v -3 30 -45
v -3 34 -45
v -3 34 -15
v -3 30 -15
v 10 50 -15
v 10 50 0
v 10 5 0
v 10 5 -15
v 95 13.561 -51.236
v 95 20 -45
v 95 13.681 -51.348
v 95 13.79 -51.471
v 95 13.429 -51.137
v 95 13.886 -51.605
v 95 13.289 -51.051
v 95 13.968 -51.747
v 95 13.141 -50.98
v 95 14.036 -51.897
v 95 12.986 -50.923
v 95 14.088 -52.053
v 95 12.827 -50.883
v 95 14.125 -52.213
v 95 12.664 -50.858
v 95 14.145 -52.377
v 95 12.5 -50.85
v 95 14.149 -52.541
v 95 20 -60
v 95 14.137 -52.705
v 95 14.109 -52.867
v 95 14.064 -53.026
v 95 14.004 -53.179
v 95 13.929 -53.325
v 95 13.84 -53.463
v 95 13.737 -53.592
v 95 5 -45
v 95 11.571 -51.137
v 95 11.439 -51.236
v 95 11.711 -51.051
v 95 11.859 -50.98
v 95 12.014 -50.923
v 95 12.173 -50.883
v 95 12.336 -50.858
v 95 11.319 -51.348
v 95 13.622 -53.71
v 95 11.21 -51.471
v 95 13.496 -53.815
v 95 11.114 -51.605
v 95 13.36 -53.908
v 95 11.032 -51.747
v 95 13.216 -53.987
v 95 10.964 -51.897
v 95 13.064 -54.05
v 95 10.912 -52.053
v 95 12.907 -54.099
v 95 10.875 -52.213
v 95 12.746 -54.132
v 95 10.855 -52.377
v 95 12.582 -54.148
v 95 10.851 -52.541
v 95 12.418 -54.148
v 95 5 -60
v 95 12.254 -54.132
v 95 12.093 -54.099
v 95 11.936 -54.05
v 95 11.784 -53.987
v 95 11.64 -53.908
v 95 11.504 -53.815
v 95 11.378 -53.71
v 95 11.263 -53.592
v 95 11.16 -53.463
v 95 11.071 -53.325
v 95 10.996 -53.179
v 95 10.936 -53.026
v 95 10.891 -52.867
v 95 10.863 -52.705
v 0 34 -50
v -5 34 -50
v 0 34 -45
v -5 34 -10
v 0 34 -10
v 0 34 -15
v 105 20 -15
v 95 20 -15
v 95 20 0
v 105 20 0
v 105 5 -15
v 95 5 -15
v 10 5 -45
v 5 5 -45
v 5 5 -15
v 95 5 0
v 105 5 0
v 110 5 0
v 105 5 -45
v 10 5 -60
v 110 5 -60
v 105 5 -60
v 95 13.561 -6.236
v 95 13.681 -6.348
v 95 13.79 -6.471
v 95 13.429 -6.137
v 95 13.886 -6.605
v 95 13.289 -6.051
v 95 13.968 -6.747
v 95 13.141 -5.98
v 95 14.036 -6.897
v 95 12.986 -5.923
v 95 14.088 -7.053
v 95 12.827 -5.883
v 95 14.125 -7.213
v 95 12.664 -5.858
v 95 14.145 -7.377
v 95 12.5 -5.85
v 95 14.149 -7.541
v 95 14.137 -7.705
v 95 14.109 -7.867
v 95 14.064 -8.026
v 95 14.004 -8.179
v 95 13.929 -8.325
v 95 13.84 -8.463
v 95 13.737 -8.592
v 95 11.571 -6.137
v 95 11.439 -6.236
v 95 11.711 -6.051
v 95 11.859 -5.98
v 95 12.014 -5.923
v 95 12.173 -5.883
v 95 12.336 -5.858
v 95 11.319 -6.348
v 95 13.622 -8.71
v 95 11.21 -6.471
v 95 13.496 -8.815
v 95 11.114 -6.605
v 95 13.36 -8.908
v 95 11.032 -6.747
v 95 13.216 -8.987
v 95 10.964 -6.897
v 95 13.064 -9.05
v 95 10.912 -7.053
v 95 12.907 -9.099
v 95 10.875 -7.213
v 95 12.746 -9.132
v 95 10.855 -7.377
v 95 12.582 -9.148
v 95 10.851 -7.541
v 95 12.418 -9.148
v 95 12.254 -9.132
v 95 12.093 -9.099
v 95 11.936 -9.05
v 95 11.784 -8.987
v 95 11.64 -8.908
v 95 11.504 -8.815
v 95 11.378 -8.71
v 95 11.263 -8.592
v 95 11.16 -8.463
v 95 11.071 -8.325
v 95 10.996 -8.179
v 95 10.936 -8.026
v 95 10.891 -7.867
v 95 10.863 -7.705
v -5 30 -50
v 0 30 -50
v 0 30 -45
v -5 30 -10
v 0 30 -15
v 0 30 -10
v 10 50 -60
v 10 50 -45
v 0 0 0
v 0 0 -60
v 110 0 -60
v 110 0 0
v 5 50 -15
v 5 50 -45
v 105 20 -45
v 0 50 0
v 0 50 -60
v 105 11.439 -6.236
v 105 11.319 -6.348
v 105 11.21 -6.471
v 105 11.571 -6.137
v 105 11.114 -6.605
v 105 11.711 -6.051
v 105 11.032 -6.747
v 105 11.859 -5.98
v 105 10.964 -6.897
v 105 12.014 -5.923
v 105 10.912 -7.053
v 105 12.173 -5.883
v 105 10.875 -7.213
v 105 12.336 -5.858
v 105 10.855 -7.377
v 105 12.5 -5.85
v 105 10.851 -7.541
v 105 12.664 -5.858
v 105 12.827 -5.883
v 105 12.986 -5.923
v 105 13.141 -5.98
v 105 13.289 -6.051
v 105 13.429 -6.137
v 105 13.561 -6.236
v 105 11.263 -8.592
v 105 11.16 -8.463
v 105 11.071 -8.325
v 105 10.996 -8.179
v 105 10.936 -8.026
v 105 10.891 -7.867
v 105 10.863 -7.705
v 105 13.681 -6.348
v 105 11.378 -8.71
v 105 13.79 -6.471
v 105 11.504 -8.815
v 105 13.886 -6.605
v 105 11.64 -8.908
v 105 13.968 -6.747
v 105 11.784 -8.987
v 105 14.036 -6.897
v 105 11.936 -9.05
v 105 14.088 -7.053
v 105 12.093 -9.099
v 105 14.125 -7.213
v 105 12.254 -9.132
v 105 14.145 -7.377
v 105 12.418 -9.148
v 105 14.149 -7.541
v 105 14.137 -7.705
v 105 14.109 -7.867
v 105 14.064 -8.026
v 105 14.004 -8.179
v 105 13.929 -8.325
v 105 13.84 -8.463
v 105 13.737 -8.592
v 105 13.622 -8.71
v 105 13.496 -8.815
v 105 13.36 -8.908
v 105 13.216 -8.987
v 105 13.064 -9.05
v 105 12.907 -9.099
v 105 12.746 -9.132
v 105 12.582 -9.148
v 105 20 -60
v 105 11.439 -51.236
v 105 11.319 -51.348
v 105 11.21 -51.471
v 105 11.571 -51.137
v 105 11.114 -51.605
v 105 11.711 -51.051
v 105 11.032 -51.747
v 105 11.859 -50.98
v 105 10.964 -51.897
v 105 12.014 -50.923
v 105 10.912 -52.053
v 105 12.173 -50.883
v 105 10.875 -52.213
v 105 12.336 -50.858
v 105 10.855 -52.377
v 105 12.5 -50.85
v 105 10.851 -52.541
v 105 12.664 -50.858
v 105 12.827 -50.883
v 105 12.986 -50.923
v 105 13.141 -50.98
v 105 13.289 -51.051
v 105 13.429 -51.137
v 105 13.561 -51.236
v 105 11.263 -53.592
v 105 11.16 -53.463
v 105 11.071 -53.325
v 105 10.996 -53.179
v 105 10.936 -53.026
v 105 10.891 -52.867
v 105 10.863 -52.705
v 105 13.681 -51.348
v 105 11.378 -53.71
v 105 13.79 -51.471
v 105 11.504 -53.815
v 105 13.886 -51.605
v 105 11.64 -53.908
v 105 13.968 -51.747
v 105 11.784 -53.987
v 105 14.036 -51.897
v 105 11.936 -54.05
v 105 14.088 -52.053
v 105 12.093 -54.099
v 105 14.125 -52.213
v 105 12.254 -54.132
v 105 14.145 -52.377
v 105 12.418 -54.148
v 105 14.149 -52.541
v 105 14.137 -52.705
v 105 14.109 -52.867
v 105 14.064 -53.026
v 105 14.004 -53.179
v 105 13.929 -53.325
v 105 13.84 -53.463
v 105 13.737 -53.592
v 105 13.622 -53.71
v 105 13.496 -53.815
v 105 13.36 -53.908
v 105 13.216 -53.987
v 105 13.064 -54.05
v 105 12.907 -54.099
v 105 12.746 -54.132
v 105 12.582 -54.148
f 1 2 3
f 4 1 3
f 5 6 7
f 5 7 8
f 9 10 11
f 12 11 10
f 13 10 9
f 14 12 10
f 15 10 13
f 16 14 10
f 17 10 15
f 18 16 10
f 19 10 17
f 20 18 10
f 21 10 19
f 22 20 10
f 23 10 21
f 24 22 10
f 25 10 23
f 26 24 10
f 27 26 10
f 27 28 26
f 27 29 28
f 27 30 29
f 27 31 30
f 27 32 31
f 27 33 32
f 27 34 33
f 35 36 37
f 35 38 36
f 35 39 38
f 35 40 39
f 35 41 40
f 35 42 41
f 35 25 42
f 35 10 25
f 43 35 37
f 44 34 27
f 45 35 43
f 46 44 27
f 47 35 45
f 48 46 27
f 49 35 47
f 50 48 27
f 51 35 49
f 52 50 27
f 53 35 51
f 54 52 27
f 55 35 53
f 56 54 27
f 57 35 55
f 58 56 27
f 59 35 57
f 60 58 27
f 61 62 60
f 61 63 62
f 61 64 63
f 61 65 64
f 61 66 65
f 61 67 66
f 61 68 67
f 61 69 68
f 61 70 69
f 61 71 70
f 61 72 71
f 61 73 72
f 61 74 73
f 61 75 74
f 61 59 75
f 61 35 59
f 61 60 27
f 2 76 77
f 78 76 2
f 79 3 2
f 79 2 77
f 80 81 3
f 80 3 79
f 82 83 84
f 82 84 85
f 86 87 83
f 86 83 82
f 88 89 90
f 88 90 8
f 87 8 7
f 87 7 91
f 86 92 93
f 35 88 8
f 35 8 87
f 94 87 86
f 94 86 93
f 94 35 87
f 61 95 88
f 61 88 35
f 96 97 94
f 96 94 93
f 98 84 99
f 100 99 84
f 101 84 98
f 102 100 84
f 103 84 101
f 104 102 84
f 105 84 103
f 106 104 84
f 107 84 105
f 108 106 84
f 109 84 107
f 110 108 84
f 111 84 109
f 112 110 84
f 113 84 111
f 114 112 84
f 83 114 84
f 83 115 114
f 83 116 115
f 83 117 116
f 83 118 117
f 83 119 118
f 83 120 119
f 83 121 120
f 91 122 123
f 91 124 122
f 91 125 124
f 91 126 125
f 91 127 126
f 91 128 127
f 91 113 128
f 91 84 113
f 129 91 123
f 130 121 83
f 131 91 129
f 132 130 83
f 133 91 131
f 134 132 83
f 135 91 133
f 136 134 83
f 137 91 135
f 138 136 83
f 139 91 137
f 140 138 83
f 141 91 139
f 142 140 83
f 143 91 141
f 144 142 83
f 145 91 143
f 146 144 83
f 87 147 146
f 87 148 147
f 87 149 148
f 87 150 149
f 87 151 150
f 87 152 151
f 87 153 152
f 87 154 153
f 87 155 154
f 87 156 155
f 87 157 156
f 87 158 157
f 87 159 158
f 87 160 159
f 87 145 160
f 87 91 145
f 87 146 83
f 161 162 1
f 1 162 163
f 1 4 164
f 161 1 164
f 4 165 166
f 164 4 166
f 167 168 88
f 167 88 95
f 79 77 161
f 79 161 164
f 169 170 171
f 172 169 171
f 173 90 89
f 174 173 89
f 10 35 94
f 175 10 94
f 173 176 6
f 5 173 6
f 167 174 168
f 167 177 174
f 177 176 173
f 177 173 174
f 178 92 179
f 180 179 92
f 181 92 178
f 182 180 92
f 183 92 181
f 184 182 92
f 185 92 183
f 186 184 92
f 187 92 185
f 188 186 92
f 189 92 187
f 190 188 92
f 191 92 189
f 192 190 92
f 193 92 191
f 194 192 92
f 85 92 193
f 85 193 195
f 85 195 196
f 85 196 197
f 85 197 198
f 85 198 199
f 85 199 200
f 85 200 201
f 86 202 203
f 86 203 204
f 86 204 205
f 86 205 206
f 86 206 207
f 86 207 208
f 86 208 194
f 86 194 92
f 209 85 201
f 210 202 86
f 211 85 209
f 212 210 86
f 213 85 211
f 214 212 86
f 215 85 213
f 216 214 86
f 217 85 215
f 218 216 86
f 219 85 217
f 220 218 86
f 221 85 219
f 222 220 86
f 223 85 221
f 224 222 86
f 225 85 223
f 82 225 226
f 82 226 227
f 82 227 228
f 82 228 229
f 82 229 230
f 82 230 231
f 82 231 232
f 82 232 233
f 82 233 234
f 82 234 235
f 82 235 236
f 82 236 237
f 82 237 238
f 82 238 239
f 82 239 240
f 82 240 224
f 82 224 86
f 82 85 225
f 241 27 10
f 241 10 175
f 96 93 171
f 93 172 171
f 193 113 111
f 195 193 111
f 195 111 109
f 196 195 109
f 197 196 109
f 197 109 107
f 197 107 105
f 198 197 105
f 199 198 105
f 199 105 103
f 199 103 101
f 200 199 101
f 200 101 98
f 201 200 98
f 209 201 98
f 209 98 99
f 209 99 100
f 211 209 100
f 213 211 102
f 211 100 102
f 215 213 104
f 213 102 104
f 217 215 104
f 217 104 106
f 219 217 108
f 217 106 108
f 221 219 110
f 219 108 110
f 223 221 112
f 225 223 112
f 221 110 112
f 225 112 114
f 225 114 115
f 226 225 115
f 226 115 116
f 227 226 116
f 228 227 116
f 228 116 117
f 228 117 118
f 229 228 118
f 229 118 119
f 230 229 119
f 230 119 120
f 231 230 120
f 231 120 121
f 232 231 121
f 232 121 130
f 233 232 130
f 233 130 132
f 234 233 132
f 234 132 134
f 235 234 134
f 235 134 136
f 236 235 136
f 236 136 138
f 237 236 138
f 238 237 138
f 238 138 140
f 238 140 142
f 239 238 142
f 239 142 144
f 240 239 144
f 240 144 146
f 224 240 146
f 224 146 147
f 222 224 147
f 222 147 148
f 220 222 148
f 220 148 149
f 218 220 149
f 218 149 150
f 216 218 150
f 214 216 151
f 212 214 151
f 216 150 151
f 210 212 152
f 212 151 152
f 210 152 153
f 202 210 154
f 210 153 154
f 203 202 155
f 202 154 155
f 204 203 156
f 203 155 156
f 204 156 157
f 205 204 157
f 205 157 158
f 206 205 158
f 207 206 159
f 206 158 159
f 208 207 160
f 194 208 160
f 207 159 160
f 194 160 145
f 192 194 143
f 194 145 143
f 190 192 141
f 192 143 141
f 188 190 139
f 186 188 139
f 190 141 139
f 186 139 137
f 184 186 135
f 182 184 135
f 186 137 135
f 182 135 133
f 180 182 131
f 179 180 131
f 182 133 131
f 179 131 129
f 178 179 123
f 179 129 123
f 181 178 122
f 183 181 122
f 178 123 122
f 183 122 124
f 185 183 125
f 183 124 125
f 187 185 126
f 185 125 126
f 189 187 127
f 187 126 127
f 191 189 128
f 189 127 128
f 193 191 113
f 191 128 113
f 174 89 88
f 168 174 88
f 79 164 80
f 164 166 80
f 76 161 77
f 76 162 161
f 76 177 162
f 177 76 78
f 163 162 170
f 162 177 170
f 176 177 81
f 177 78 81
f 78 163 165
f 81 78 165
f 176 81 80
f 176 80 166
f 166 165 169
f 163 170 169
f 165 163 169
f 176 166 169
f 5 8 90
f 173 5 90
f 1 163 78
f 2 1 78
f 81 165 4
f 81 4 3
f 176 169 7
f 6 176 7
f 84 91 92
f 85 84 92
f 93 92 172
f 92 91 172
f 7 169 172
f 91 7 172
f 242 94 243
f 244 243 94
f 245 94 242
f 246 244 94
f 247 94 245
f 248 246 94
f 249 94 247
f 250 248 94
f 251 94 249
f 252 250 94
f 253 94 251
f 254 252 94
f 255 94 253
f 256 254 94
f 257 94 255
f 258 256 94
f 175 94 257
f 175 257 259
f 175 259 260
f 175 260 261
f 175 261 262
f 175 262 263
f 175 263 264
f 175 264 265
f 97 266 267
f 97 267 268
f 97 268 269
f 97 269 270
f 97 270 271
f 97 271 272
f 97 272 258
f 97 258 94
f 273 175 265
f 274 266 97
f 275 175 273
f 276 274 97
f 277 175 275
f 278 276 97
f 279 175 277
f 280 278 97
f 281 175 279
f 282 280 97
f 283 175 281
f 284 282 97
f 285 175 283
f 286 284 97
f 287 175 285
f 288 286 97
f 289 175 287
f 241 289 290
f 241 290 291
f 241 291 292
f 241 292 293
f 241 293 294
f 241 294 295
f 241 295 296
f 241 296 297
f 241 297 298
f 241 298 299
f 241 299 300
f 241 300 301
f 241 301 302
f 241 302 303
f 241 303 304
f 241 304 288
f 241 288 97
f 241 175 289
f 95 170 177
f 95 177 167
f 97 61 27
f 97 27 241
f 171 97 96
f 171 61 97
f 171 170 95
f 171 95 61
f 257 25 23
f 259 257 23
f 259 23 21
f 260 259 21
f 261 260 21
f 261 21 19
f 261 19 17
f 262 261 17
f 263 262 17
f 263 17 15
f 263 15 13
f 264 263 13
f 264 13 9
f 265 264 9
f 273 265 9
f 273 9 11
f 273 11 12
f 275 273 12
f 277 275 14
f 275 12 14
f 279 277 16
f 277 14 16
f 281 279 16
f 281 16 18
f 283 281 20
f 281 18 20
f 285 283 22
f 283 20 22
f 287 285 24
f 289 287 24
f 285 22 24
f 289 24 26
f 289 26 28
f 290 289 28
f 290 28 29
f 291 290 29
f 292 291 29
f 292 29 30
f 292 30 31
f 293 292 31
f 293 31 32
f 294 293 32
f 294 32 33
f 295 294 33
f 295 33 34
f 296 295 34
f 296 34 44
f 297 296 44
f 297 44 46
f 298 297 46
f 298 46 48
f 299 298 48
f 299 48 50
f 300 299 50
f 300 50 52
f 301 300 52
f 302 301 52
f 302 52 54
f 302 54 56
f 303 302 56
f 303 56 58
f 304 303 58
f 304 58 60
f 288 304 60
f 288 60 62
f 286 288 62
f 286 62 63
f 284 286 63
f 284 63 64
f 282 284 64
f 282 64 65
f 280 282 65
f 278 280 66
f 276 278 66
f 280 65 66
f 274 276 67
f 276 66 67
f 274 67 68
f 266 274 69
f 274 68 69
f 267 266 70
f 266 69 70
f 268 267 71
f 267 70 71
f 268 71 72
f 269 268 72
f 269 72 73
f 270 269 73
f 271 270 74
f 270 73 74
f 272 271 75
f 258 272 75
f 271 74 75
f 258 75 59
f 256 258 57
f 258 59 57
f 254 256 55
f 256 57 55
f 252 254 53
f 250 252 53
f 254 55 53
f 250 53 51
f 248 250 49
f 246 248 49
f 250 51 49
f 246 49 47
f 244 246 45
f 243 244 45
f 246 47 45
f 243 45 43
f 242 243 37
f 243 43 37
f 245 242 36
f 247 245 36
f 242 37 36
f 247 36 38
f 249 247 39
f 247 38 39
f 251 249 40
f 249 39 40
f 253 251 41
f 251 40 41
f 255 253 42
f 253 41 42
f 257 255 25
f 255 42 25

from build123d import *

# Parameters (mm, degrees)
CROQUIS1_W                = 110
CROQUIS1_H                = 60
SALIENTE_EXTRUIR1_DEPTH   = 5
SALIENTE_EXTRUIR2_DEPTH   = 45
CROQUIS4_W                = 15
CROQUIS4_H                = 15
SALIENTE_EXTRUIR3_DEPTH   = 15
CROQUIS5_W                = 15
CROQUIS5_H                = 15
CORTAR_EXTRUIR1_DEPTH     = 5
TALADRO_ROSCADO_M41_D     = 3.3
TALADRO_ROSCADO_M41_DEPTH = 14.008579979
TALADRO_ROSCADO_M41_TIP   = 0.991420021
CROQUIS11_W               = 5
CROQUIS11_H               = 4
SALIENTE_EXTRUIR4_DEPTH   = 3
CROQUIS12_W               = 40
CROQUIS12_H               = 4
SALIENTE_EXTRUIR5_DEPTH   = 2


with BuildPart() as part:
    # Croquis1 → Saliente-Extruir1 (new body)
    with BuildSketch(Plane(origin=(0, 0, 0), x_dir=(1, 0, 0), z_dir=(0, 1, 0))):
        with Locations((55, 30)):
            Rectangle(CROQUIS1_W, CROQUIS1_H)
    extrude(amount=SALIENTE_EXTRUIR1_DEPTH)

    # Croquis2 → Saliente-Extruir2 (add)
    with BuildSketch(Plane(origin=(0, 5, 0), x_dir=(1, 0, 0), z_dir=(0, 1, 0))):
        Polygon((0, 0), (10, 0), (10, 15), (5, 15), (5, 45), (10, 45), (10, 60), (0, 60), align=None)
    extrude(amount=SALIENTE_EXTRUIR2_DEPTH)

    # Croquis4 → Saliente-Extruir3 (add)
    with BuildSketch(Plane(origin=(0, 5, 0), x_dir=(1, 0, 0), z_dir=(0, 1, 0))):
        with Locations((102.5, 52.5)):
            Rectangle(CROQUIS4_W, CROQUIS4_H)
        with Locations((102.5, 7.5)):
            Rectangle(CROQUIS4_W, CROQUIS4_H)
    extrude(amount=SALIENTE_EXTRUIR3_DEPTH)

    # Croquis5 → Cortar-Extruir1 (cut)
    with BuildSketch(Plane(origin=(110, 0, 0), x_dir=(0, 0, -1), z_dir=(1, 0, 0))):
        with Locations((7.5, 12.5)):
            Rectangle(CROQUIS5_W, CROQUIS5_H)
        with Locations((52.5, 12.5)):
            Rectangle(CROQUIS5_W, CROQUIS5_H)
    extrude(amount=-CORTAR_EXTRUIR1_DEPTH, mode=Mode.SUBTRACT)

    # Taladro roscado M41
    with Locations(Plane(origin=(105, 0, 0), x_dir=(0, 0, -1), z_dir=(1, 0, 0))):
        with Locations((7.5, 12.5), (52.5, 12.5)):
            Hole(TALADRO_ROSCADO_M41_D / 2, depth=TALADRO_ROSCADO_M41_DEPTH)
            with Locations((0, 0, -(TALADRO_ROSCADO_M41_DEPTH + TALADRO_ROSCADO_M41_TIP / 2))):  # 118° drill point
                Cone(0, TALADRO_ROSCADO_M41_D / 2, TALADRO_ROSCADO_M41_TIP, mode=Mode.SUBTRACT)

    # Croquis11 → Saliente-Extruir4 (add)
    with BuildSketch(Plane.ZY):
        with Locations((-47.5, 32)):
            Rectangle(CROQUIS11_W, CROQUIS11_H)
        with Locations((-12.5, 32)):
            Rectangle(CROQUIS11_W, CROQUIS11_H)
    extrude(amount=SALIENTE_EXTRUIR4_DEPTH)

    # Croquis12 → Saliente-Extruir5 (add)
    with BuildSketch(Plane.ZY.offset(3)):
        with Locations((-30, 32)):
            Rectangle(CROQUIS12_W, CROQUIS12_H)
    extrude(amount=SALIENTE_EXTRUIR5_DEPTH)


solid = part.part
